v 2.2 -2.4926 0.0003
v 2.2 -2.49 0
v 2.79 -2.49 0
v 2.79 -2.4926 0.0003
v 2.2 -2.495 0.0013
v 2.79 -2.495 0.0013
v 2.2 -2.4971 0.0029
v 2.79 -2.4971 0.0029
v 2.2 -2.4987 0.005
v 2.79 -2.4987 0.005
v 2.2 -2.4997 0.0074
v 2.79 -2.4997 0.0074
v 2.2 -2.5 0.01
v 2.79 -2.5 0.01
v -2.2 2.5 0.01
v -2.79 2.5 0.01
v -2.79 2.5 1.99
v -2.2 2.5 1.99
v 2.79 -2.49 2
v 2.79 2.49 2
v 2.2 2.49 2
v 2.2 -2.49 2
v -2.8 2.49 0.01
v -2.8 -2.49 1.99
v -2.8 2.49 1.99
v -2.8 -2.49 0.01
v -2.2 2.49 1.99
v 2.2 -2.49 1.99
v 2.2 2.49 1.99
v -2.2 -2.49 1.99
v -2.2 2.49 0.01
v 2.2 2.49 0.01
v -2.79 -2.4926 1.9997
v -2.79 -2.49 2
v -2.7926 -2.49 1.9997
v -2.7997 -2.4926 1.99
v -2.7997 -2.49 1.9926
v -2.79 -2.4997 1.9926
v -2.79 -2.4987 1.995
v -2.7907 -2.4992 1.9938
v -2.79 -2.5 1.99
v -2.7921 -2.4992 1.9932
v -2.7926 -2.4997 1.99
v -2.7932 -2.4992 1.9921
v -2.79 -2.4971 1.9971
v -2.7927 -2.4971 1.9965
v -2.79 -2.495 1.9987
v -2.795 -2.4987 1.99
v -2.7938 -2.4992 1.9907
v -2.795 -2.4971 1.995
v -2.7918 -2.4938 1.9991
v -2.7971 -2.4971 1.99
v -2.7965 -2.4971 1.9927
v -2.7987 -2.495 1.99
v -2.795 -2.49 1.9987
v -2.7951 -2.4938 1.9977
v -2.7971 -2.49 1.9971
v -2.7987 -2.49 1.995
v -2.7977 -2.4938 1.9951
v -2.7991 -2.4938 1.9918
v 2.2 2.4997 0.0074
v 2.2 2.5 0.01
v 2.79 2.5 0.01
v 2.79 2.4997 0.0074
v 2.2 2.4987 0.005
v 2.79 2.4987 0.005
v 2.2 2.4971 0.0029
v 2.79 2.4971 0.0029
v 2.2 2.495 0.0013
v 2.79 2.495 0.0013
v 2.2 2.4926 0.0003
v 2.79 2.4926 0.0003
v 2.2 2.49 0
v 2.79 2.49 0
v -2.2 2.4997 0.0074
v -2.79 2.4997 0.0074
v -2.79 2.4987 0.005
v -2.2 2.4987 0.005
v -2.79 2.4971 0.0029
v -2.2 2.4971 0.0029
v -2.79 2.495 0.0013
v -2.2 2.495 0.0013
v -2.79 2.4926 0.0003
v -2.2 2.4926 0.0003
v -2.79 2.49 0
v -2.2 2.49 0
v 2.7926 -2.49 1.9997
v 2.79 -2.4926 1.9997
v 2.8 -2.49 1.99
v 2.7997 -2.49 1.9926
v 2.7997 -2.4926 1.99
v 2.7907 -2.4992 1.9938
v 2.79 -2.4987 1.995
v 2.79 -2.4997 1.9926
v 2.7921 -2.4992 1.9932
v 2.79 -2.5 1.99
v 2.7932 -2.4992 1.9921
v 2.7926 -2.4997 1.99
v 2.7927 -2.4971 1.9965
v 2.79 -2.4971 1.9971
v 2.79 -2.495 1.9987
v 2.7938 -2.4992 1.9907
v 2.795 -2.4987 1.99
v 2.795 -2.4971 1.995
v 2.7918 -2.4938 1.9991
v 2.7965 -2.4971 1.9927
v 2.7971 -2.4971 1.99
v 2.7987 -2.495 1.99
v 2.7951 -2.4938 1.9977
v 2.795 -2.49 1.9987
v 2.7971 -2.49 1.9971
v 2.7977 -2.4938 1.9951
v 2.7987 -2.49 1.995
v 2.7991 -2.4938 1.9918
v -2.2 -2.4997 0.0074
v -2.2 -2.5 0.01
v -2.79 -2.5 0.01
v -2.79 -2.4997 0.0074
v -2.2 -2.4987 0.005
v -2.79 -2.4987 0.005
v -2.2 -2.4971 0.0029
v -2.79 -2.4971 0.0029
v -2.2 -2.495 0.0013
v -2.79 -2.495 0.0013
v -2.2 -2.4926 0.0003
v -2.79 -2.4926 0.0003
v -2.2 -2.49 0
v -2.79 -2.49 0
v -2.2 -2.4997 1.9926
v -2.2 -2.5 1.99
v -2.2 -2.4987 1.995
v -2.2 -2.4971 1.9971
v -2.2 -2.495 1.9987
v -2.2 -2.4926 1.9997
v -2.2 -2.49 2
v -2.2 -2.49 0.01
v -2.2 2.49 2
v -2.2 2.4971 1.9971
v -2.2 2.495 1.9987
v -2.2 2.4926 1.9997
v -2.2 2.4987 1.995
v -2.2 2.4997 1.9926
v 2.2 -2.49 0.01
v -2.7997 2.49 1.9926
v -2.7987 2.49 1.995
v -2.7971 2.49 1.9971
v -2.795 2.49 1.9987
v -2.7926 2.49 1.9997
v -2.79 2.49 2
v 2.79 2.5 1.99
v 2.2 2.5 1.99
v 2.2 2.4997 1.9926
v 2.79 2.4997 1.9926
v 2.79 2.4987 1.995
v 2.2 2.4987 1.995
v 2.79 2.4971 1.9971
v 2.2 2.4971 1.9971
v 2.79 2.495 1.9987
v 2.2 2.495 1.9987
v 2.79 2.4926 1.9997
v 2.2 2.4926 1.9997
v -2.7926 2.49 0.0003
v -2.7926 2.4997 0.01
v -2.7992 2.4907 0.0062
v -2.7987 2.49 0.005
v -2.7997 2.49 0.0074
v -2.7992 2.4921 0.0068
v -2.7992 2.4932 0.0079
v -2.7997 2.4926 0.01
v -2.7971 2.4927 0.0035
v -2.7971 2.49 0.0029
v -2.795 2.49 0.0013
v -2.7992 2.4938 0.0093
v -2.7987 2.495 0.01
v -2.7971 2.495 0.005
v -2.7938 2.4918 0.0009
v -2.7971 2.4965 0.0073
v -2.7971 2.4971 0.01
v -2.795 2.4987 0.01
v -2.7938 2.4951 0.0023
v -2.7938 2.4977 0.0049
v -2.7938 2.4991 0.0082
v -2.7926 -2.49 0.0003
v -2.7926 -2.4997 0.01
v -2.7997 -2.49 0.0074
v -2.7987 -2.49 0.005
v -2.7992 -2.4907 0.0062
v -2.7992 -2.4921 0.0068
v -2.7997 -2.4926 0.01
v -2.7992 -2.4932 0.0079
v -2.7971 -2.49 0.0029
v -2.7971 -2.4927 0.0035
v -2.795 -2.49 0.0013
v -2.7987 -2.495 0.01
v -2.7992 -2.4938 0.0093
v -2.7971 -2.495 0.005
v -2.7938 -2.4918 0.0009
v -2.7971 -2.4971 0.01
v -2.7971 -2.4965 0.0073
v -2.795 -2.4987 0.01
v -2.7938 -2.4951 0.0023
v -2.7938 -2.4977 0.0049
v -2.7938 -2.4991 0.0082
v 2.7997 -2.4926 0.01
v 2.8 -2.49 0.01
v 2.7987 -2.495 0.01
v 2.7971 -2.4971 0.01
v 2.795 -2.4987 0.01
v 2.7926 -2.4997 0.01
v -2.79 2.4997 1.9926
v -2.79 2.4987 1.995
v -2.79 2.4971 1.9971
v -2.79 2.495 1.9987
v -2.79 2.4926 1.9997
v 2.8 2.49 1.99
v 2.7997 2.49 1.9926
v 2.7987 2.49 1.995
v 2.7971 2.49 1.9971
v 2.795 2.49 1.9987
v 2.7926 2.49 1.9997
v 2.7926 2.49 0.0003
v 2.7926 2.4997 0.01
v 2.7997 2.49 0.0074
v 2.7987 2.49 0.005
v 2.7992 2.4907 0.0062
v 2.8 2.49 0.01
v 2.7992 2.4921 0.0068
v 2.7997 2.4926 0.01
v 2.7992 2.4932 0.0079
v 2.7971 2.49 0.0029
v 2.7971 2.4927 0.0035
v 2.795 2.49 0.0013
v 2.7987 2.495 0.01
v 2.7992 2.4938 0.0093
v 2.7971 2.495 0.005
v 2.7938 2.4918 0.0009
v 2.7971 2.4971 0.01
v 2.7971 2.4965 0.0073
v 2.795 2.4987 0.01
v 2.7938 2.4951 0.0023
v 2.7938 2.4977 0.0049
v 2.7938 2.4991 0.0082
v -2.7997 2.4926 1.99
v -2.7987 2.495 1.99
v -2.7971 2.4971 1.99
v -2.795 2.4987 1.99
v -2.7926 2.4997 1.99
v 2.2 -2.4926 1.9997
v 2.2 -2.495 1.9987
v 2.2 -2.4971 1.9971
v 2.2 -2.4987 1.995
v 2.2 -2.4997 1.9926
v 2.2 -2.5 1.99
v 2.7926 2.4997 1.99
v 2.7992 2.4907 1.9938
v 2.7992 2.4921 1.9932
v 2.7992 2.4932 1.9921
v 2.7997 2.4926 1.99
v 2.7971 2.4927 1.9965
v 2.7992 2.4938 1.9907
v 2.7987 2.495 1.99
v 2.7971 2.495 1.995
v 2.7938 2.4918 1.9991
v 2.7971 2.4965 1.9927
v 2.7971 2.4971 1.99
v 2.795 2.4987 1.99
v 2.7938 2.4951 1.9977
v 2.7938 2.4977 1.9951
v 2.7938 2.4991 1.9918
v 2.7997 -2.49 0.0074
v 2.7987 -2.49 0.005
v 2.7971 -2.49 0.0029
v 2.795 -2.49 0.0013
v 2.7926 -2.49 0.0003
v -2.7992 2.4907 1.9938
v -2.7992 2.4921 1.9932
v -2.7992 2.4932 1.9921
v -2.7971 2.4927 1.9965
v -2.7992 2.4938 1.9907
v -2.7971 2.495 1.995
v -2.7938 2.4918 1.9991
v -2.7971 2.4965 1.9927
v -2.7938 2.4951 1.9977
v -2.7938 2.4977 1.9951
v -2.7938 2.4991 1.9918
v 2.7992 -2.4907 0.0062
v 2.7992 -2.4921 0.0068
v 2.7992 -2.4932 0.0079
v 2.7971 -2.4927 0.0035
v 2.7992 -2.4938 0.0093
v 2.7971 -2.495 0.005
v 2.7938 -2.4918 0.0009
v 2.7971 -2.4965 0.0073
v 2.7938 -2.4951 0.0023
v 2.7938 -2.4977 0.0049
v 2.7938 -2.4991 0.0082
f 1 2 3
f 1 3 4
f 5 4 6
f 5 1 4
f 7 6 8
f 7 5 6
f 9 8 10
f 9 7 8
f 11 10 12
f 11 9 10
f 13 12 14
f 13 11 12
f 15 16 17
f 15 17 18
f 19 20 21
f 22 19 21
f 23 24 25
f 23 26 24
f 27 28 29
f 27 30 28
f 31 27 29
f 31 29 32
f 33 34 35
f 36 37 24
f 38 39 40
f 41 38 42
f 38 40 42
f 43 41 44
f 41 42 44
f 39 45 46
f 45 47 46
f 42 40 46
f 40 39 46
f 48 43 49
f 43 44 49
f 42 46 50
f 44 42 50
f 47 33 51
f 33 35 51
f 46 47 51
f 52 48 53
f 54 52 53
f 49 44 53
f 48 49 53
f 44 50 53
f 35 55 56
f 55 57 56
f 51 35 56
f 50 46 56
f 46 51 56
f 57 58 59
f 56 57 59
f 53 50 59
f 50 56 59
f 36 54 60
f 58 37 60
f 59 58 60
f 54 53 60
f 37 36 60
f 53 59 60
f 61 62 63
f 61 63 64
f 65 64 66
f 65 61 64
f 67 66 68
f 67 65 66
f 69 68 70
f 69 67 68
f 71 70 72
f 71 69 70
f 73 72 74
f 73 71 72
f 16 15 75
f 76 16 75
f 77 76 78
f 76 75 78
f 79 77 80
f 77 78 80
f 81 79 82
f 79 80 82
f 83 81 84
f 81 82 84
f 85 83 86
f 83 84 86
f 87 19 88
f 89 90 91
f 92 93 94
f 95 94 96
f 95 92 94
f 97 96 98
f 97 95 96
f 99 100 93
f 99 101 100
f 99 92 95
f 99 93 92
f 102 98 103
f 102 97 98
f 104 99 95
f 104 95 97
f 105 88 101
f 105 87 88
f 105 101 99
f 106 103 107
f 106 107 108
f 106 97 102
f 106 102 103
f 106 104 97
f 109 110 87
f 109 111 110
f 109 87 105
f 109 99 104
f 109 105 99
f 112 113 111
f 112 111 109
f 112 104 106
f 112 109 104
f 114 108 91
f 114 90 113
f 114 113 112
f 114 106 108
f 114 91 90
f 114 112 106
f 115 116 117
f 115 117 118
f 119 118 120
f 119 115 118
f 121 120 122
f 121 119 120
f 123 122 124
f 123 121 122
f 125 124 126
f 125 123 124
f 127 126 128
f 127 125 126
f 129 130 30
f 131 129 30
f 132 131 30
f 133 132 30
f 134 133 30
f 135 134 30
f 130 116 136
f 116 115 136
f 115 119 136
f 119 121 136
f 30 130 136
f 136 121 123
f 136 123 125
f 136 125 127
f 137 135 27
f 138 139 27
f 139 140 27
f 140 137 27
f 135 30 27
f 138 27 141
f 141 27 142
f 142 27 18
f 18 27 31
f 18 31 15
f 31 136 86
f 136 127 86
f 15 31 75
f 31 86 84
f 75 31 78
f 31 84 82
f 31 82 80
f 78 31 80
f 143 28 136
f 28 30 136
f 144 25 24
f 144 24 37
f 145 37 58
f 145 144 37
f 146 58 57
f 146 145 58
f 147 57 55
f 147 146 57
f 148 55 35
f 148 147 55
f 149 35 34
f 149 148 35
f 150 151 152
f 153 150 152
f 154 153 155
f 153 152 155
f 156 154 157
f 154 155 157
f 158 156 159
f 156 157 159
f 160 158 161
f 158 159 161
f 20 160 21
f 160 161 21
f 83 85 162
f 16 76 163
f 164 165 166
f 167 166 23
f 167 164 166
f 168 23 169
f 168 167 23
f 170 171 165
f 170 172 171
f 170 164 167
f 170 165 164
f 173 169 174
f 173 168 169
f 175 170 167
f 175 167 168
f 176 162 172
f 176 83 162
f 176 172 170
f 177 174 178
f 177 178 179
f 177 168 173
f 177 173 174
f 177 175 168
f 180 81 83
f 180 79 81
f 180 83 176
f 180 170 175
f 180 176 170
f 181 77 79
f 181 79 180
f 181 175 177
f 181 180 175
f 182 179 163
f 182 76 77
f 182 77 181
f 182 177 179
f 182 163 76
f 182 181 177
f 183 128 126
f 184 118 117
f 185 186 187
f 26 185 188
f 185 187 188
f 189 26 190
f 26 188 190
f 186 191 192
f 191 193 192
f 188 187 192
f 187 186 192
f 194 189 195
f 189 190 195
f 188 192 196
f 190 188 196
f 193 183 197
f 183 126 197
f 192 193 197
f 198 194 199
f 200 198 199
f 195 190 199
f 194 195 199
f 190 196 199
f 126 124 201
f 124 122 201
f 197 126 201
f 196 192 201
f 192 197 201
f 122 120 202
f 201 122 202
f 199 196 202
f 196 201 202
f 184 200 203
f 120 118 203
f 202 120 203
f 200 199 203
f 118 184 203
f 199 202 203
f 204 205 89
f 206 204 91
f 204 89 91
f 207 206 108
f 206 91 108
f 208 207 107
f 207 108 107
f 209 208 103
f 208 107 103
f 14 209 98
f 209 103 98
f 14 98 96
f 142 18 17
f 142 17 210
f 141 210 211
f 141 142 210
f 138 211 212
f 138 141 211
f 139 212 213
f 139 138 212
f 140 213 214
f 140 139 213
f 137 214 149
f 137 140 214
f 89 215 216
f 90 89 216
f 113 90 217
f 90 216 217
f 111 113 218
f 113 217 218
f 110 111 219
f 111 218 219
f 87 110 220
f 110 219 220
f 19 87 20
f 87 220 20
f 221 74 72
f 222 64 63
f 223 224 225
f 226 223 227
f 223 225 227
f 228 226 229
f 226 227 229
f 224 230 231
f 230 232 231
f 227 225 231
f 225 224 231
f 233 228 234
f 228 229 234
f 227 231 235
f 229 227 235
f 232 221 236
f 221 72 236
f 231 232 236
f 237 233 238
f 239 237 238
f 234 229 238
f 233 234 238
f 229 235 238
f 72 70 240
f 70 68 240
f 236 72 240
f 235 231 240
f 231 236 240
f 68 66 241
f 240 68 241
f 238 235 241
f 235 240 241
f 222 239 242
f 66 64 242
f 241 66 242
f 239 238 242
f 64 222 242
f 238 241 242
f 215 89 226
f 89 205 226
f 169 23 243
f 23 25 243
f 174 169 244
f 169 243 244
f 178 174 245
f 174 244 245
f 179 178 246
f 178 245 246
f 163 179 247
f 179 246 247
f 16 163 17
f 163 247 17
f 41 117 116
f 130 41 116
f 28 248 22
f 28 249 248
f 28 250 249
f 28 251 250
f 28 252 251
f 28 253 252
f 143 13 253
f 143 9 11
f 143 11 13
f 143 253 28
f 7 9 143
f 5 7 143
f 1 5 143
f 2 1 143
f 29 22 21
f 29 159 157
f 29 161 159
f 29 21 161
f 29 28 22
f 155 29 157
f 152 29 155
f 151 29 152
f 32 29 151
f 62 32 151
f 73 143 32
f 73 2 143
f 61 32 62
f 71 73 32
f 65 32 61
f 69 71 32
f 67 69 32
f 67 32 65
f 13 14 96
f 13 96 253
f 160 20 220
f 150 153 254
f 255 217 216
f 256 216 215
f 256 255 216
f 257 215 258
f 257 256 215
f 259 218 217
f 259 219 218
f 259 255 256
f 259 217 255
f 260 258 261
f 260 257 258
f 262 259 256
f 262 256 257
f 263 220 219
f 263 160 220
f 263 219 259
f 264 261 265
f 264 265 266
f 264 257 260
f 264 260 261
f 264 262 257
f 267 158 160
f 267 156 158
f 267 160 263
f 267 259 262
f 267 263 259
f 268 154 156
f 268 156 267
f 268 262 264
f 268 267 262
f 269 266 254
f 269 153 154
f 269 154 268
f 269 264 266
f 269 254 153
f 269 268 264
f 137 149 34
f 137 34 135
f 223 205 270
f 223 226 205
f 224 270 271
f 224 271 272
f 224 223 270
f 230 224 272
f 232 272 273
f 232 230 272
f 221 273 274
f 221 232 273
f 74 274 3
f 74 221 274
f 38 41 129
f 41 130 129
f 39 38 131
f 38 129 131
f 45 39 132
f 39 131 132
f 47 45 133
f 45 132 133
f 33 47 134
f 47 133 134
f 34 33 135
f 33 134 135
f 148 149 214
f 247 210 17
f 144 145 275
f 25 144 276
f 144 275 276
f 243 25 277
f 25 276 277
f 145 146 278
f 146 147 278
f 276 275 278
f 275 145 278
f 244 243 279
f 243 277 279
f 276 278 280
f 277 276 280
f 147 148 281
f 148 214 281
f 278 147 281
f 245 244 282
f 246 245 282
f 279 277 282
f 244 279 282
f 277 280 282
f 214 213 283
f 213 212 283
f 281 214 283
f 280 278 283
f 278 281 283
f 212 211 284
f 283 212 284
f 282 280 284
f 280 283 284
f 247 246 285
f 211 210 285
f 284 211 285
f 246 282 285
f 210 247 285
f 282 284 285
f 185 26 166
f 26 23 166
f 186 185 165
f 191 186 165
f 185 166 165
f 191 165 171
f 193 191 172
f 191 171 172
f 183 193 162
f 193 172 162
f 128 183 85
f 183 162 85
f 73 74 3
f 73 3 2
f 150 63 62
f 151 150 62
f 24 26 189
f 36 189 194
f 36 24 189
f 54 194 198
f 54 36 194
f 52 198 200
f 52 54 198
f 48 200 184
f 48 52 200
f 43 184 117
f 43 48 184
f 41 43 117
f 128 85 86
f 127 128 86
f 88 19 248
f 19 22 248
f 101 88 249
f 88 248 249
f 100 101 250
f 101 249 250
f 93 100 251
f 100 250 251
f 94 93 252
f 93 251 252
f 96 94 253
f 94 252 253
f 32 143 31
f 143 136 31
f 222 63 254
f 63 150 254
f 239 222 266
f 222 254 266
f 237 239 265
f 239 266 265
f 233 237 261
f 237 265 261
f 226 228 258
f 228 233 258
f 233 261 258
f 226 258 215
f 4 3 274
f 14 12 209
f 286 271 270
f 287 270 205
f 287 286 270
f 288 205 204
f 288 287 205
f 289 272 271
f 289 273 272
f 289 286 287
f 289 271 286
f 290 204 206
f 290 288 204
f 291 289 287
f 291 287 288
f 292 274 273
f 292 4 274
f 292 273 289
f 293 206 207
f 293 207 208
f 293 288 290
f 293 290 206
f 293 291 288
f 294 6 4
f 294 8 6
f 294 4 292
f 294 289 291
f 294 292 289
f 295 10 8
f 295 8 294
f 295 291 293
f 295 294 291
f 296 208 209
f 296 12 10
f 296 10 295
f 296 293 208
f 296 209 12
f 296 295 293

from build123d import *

# Parameters (mm, degrees)
SKETCH1_W            = 0.6
SKETCH1_H            = 5
THICKNESS_DEPTH      = 2
FILLET1_R            = 0.01
SKETCH2_W            = 1.98
SKETCH2_H            = 4.98
BOSS_EXTRUDE2_DEPTH  = 2.2
FILLET1_OF_MIRROR3_R = 0.01


with BuildPart() as part:
    # Sketch1 → THICKNESS (new body)
    with BuildSketch(Plane.XY):
        with Locations((-2.5, 0)):
            Rectangle(SKETCH1_W, SKETCH1_H)
    thickness = extrude(amount=THICKNESS_DEPTH)

    # Fillet1
    fillet1_edges = [part.edges().sort_by_distance(p)[0] for p in [
        (-2.5, 2.5, 2),
        (-2.8, 0, 2),
        (-2.5, 2.5, 0),
        (-2.5, -2.5, 0),
        (-2.8, 0, 0),
        (-2.5, -2.5, 2),
        (-2.8, 2.5, 1),
        (-2.8, -2.5, 1),
    ]]
    fillet(fillet1_edges, radius=FILLET1_R)

    # Sketch2 → Boss-Extrude2 (add)
    with BuildSketch(Plane(origin=(0, 0, 0), x_dir=(0, 0, -1), z_dir=(1, 0, 0))):
        with Locations((-1, 0)):
            Rectangle(SKETCH2_W, SKETCH2_H)
    boss_extrude2 = extrude(amount=-BOSS_EXTRUDE2_DEPTH)

    # Mirror3: THICKNESS, Boss-Extrude2 across plane
    add(thickness.mirror(Plane(origin=(0, 0, 0), x_dir=(0, 0, 1), z_dir=(1, 0, 0))))
    add(boss_extrude2.mirror(Plane(origin=(0, 0, 0), x_dir=(0, 0, 1), z_dir=(1, 0, 0))))

    # Fillet1 of Mirror3
    fillet1_of_mirror3_edges = [part.edges().sort_by_distance(p)[0] for p in [
        (2.5, 2.5, 2),
        (2.8, 0, 2),
        (2.5, 2.5, 0),
        (2.5, -2.5, 0),
        (2.8, 0, 0),
        (2.5, -2.5, 2),
        (2.8, 2.5, 1),
        (2.8, -2.5, 1),
    ]]
    fillet(fillet1_of_mirror3_edges, radius=FILLET1_OF_MIRROR3_R)


solid = part.part
